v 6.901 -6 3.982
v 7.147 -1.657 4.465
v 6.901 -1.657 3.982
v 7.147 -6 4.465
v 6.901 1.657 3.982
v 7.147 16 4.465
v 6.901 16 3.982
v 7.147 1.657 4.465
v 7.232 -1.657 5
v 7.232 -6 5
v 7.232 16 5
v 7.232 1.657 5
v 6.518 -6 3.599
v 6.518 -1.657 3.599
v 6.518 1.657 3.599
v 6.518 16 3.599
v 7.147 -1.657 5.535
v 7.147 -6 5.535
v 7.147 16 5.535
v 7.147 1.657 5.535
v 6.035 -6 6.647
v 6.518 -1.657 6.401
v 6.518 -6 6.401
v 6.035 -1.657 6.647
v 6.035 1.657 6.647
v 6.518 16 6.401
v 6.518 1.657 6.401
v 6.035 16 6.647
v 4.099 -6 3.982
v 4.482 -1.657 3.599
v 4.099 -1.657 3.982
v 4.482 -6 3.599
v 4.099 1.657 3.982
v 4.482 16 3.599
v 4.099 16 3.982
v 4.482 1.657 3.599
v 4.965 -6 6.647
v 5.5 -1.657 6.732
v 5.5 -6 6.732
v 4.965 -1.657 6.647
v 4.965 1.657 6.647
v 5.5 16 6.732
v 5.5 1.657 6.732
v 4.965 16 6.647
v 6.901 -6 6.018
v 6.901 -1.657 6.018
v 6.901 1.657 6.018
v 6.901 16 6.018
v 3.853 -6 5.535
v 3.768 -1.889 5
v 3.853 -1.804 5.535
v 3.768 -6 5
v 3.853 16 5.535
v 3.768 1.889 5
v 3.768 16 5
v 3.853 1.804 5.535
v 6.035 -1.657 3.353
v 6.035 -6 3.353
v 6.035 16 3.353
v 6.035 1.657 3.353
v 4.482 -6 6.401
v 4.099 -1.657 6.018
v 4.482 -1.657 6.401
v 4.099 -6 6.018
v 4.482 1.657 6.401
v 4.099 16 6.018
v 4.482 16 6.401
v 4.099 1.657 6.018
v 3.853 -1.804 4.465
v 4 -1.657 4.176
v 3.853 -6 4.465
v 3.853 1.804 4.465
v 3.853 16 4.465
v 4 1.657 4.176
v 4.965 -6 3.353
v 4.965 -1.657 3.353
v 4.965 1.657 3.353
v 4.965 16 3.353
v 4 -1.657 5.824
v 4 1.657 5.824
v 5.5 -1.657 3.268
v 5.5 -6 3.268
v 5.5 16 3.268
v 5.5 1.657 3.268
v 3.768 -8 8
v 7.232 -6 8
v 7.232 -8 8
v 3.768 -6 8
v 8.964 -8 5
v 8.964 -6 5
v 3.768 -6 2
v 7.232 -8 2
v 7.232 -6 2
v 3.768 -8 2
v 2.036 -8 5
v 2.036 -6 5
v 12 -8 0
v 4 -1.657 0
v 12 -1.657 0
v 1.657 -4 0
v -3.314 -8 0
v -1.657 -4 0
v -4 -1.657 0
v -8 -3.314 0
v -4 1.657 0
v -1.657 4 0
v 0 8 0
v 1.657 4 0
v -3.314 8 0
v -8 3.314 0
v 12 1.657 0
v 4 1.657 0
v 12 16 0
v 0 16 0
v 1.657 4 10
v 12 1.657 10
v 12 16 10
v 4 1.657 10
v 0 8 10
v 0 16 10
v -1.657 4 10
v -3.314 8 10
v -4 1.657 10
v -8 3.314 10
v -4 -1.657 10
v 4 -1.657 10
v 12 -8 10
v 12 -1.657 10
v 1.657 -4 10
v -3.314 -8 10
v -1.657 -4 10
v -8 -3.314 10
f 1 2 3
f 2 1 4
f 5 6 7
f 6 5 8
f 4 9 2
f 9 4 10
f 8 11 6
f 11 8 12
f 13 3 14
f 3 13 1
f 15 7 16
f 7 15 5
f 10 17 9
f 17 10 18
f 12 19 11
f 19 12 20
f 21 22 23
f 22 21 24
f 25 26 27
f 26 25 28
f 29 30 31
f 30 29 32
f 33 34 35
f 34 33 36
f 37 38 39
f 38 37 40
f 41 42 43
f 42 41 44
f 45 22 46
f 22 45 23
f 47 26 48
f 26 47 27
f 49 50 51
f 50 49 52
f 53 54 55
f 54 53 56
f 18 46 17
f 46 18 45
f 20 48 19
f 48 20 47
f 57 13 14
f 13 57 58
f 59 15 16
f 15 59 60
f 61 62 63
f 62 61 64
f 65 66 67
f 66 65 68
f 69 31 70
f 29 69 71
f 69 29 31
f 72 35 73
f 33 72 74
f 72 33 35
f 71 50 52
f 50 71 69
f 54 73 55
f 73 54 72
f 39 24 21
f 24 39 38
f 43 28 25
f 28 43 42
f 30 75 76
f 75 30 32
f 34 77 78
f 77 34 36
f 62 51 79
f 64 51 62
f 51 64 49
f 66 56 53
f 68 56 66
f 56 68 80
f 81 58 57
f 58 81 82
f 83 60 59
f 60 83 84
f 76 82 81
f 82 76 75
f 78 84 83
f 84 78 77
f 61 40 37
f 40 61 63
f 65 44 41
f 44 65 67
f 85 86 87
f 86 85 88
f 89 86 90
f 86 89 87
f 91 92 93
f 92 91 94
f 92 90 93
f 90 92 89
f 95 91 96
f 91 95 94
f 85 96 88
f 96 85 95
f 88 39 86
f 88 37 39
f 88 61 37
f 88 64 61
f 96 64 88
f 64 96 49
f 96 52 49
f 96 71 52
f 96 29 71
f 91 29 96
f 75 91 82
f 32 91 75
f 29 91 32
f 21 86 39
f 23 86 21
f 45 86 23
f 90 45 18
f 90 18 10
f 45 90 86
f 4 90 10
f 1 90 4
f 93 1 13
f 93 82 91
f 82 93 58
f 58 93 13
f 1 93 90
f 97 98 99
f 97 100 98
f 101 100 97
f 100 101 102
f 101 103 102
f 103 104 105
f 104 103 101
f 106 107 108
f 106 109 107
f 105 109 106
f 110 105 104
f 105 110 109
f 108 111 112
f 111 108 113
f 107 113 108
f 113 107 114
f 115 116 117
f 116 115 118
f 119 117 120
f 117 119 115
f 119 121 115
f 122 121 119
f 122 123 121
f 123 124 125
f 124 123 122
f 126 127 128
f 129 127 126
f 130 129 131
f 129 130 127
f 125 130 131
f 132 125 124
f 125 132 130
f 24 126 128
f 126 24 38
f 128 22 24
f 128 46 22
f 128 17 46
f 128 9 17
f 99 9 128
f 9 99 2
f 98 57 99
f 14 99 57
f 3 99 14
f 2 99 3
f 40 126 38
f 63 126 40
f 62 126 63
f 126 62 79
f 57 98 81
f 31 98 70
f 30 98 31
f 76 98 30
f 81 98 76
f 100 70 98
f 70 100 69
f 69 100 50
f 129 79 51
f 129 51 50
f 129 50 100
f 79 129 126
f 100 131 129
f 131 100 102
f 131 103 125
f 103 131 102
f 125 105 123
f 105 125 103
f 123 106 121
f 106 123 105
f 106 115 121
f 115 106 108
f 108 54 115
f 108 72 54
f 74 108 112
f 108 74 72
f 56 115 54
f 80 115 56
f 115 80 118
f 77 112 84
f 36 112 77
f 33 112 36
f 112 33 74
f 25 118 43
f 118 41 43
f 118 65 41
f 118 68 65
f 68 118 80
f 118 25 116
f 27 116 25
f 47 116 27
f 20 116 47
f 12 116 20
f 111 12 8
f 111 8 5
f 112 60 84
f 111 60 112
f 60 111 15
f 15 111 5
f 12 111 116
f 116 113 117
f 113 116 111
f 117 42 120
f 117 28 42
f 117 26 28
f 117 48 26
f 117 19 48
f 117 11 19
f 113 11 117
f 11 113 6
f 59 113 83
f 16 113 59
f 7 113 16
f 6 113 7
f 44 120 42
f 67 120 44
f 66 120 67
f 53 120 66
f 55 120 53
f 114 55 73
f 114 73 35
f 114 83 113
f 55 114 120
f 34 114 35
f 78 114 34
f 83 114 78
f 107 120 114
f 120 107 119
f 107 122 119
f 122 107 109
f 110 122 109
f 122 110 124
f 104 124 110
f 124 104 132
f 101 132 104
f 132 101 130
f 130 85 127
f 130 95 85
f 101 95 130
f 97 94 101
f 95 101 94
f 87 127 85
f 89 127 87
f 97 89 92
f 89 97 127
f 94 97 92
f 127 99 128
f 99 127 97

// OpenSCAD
include <wallace2.scad>;
bed_mount2();

module bed_mount2() difference() {
	linear_extrude(height = 10, convexity = 5) difference() {
		union() {
			rotate(180 / 8) circle((rod_size + 8) * da8, $fn = 8);
			translate([0, -rod_size / 2 - 4, 0]) square([rod_size / 2 + 8, max(rod_size + 8, rod_size / 2 + 4 + bed_mount_height)]);
		}
		rotate(180 / 8) circle(rod_size * da8, $fn = 8);
		translate([0, -rod_size / (1 + sqrt(2)) / 2, 0]) square([rod_size + 10, rod_size / (1 + sqrt(2))]);
	}
	translate([rod_size / 2 + 1.5, -rod_size / 2 - 6, 5]) rotate([-90, 0, 0]) {
		cylinder(r = m3_size * da6, h = max(rod_size + 12, rod_size / 2 + 7 + bed_mount_height, $fn = 6));
		cylinder(r = m3_nut_size * da6, h = 4, $fn = 6);
	}
}
